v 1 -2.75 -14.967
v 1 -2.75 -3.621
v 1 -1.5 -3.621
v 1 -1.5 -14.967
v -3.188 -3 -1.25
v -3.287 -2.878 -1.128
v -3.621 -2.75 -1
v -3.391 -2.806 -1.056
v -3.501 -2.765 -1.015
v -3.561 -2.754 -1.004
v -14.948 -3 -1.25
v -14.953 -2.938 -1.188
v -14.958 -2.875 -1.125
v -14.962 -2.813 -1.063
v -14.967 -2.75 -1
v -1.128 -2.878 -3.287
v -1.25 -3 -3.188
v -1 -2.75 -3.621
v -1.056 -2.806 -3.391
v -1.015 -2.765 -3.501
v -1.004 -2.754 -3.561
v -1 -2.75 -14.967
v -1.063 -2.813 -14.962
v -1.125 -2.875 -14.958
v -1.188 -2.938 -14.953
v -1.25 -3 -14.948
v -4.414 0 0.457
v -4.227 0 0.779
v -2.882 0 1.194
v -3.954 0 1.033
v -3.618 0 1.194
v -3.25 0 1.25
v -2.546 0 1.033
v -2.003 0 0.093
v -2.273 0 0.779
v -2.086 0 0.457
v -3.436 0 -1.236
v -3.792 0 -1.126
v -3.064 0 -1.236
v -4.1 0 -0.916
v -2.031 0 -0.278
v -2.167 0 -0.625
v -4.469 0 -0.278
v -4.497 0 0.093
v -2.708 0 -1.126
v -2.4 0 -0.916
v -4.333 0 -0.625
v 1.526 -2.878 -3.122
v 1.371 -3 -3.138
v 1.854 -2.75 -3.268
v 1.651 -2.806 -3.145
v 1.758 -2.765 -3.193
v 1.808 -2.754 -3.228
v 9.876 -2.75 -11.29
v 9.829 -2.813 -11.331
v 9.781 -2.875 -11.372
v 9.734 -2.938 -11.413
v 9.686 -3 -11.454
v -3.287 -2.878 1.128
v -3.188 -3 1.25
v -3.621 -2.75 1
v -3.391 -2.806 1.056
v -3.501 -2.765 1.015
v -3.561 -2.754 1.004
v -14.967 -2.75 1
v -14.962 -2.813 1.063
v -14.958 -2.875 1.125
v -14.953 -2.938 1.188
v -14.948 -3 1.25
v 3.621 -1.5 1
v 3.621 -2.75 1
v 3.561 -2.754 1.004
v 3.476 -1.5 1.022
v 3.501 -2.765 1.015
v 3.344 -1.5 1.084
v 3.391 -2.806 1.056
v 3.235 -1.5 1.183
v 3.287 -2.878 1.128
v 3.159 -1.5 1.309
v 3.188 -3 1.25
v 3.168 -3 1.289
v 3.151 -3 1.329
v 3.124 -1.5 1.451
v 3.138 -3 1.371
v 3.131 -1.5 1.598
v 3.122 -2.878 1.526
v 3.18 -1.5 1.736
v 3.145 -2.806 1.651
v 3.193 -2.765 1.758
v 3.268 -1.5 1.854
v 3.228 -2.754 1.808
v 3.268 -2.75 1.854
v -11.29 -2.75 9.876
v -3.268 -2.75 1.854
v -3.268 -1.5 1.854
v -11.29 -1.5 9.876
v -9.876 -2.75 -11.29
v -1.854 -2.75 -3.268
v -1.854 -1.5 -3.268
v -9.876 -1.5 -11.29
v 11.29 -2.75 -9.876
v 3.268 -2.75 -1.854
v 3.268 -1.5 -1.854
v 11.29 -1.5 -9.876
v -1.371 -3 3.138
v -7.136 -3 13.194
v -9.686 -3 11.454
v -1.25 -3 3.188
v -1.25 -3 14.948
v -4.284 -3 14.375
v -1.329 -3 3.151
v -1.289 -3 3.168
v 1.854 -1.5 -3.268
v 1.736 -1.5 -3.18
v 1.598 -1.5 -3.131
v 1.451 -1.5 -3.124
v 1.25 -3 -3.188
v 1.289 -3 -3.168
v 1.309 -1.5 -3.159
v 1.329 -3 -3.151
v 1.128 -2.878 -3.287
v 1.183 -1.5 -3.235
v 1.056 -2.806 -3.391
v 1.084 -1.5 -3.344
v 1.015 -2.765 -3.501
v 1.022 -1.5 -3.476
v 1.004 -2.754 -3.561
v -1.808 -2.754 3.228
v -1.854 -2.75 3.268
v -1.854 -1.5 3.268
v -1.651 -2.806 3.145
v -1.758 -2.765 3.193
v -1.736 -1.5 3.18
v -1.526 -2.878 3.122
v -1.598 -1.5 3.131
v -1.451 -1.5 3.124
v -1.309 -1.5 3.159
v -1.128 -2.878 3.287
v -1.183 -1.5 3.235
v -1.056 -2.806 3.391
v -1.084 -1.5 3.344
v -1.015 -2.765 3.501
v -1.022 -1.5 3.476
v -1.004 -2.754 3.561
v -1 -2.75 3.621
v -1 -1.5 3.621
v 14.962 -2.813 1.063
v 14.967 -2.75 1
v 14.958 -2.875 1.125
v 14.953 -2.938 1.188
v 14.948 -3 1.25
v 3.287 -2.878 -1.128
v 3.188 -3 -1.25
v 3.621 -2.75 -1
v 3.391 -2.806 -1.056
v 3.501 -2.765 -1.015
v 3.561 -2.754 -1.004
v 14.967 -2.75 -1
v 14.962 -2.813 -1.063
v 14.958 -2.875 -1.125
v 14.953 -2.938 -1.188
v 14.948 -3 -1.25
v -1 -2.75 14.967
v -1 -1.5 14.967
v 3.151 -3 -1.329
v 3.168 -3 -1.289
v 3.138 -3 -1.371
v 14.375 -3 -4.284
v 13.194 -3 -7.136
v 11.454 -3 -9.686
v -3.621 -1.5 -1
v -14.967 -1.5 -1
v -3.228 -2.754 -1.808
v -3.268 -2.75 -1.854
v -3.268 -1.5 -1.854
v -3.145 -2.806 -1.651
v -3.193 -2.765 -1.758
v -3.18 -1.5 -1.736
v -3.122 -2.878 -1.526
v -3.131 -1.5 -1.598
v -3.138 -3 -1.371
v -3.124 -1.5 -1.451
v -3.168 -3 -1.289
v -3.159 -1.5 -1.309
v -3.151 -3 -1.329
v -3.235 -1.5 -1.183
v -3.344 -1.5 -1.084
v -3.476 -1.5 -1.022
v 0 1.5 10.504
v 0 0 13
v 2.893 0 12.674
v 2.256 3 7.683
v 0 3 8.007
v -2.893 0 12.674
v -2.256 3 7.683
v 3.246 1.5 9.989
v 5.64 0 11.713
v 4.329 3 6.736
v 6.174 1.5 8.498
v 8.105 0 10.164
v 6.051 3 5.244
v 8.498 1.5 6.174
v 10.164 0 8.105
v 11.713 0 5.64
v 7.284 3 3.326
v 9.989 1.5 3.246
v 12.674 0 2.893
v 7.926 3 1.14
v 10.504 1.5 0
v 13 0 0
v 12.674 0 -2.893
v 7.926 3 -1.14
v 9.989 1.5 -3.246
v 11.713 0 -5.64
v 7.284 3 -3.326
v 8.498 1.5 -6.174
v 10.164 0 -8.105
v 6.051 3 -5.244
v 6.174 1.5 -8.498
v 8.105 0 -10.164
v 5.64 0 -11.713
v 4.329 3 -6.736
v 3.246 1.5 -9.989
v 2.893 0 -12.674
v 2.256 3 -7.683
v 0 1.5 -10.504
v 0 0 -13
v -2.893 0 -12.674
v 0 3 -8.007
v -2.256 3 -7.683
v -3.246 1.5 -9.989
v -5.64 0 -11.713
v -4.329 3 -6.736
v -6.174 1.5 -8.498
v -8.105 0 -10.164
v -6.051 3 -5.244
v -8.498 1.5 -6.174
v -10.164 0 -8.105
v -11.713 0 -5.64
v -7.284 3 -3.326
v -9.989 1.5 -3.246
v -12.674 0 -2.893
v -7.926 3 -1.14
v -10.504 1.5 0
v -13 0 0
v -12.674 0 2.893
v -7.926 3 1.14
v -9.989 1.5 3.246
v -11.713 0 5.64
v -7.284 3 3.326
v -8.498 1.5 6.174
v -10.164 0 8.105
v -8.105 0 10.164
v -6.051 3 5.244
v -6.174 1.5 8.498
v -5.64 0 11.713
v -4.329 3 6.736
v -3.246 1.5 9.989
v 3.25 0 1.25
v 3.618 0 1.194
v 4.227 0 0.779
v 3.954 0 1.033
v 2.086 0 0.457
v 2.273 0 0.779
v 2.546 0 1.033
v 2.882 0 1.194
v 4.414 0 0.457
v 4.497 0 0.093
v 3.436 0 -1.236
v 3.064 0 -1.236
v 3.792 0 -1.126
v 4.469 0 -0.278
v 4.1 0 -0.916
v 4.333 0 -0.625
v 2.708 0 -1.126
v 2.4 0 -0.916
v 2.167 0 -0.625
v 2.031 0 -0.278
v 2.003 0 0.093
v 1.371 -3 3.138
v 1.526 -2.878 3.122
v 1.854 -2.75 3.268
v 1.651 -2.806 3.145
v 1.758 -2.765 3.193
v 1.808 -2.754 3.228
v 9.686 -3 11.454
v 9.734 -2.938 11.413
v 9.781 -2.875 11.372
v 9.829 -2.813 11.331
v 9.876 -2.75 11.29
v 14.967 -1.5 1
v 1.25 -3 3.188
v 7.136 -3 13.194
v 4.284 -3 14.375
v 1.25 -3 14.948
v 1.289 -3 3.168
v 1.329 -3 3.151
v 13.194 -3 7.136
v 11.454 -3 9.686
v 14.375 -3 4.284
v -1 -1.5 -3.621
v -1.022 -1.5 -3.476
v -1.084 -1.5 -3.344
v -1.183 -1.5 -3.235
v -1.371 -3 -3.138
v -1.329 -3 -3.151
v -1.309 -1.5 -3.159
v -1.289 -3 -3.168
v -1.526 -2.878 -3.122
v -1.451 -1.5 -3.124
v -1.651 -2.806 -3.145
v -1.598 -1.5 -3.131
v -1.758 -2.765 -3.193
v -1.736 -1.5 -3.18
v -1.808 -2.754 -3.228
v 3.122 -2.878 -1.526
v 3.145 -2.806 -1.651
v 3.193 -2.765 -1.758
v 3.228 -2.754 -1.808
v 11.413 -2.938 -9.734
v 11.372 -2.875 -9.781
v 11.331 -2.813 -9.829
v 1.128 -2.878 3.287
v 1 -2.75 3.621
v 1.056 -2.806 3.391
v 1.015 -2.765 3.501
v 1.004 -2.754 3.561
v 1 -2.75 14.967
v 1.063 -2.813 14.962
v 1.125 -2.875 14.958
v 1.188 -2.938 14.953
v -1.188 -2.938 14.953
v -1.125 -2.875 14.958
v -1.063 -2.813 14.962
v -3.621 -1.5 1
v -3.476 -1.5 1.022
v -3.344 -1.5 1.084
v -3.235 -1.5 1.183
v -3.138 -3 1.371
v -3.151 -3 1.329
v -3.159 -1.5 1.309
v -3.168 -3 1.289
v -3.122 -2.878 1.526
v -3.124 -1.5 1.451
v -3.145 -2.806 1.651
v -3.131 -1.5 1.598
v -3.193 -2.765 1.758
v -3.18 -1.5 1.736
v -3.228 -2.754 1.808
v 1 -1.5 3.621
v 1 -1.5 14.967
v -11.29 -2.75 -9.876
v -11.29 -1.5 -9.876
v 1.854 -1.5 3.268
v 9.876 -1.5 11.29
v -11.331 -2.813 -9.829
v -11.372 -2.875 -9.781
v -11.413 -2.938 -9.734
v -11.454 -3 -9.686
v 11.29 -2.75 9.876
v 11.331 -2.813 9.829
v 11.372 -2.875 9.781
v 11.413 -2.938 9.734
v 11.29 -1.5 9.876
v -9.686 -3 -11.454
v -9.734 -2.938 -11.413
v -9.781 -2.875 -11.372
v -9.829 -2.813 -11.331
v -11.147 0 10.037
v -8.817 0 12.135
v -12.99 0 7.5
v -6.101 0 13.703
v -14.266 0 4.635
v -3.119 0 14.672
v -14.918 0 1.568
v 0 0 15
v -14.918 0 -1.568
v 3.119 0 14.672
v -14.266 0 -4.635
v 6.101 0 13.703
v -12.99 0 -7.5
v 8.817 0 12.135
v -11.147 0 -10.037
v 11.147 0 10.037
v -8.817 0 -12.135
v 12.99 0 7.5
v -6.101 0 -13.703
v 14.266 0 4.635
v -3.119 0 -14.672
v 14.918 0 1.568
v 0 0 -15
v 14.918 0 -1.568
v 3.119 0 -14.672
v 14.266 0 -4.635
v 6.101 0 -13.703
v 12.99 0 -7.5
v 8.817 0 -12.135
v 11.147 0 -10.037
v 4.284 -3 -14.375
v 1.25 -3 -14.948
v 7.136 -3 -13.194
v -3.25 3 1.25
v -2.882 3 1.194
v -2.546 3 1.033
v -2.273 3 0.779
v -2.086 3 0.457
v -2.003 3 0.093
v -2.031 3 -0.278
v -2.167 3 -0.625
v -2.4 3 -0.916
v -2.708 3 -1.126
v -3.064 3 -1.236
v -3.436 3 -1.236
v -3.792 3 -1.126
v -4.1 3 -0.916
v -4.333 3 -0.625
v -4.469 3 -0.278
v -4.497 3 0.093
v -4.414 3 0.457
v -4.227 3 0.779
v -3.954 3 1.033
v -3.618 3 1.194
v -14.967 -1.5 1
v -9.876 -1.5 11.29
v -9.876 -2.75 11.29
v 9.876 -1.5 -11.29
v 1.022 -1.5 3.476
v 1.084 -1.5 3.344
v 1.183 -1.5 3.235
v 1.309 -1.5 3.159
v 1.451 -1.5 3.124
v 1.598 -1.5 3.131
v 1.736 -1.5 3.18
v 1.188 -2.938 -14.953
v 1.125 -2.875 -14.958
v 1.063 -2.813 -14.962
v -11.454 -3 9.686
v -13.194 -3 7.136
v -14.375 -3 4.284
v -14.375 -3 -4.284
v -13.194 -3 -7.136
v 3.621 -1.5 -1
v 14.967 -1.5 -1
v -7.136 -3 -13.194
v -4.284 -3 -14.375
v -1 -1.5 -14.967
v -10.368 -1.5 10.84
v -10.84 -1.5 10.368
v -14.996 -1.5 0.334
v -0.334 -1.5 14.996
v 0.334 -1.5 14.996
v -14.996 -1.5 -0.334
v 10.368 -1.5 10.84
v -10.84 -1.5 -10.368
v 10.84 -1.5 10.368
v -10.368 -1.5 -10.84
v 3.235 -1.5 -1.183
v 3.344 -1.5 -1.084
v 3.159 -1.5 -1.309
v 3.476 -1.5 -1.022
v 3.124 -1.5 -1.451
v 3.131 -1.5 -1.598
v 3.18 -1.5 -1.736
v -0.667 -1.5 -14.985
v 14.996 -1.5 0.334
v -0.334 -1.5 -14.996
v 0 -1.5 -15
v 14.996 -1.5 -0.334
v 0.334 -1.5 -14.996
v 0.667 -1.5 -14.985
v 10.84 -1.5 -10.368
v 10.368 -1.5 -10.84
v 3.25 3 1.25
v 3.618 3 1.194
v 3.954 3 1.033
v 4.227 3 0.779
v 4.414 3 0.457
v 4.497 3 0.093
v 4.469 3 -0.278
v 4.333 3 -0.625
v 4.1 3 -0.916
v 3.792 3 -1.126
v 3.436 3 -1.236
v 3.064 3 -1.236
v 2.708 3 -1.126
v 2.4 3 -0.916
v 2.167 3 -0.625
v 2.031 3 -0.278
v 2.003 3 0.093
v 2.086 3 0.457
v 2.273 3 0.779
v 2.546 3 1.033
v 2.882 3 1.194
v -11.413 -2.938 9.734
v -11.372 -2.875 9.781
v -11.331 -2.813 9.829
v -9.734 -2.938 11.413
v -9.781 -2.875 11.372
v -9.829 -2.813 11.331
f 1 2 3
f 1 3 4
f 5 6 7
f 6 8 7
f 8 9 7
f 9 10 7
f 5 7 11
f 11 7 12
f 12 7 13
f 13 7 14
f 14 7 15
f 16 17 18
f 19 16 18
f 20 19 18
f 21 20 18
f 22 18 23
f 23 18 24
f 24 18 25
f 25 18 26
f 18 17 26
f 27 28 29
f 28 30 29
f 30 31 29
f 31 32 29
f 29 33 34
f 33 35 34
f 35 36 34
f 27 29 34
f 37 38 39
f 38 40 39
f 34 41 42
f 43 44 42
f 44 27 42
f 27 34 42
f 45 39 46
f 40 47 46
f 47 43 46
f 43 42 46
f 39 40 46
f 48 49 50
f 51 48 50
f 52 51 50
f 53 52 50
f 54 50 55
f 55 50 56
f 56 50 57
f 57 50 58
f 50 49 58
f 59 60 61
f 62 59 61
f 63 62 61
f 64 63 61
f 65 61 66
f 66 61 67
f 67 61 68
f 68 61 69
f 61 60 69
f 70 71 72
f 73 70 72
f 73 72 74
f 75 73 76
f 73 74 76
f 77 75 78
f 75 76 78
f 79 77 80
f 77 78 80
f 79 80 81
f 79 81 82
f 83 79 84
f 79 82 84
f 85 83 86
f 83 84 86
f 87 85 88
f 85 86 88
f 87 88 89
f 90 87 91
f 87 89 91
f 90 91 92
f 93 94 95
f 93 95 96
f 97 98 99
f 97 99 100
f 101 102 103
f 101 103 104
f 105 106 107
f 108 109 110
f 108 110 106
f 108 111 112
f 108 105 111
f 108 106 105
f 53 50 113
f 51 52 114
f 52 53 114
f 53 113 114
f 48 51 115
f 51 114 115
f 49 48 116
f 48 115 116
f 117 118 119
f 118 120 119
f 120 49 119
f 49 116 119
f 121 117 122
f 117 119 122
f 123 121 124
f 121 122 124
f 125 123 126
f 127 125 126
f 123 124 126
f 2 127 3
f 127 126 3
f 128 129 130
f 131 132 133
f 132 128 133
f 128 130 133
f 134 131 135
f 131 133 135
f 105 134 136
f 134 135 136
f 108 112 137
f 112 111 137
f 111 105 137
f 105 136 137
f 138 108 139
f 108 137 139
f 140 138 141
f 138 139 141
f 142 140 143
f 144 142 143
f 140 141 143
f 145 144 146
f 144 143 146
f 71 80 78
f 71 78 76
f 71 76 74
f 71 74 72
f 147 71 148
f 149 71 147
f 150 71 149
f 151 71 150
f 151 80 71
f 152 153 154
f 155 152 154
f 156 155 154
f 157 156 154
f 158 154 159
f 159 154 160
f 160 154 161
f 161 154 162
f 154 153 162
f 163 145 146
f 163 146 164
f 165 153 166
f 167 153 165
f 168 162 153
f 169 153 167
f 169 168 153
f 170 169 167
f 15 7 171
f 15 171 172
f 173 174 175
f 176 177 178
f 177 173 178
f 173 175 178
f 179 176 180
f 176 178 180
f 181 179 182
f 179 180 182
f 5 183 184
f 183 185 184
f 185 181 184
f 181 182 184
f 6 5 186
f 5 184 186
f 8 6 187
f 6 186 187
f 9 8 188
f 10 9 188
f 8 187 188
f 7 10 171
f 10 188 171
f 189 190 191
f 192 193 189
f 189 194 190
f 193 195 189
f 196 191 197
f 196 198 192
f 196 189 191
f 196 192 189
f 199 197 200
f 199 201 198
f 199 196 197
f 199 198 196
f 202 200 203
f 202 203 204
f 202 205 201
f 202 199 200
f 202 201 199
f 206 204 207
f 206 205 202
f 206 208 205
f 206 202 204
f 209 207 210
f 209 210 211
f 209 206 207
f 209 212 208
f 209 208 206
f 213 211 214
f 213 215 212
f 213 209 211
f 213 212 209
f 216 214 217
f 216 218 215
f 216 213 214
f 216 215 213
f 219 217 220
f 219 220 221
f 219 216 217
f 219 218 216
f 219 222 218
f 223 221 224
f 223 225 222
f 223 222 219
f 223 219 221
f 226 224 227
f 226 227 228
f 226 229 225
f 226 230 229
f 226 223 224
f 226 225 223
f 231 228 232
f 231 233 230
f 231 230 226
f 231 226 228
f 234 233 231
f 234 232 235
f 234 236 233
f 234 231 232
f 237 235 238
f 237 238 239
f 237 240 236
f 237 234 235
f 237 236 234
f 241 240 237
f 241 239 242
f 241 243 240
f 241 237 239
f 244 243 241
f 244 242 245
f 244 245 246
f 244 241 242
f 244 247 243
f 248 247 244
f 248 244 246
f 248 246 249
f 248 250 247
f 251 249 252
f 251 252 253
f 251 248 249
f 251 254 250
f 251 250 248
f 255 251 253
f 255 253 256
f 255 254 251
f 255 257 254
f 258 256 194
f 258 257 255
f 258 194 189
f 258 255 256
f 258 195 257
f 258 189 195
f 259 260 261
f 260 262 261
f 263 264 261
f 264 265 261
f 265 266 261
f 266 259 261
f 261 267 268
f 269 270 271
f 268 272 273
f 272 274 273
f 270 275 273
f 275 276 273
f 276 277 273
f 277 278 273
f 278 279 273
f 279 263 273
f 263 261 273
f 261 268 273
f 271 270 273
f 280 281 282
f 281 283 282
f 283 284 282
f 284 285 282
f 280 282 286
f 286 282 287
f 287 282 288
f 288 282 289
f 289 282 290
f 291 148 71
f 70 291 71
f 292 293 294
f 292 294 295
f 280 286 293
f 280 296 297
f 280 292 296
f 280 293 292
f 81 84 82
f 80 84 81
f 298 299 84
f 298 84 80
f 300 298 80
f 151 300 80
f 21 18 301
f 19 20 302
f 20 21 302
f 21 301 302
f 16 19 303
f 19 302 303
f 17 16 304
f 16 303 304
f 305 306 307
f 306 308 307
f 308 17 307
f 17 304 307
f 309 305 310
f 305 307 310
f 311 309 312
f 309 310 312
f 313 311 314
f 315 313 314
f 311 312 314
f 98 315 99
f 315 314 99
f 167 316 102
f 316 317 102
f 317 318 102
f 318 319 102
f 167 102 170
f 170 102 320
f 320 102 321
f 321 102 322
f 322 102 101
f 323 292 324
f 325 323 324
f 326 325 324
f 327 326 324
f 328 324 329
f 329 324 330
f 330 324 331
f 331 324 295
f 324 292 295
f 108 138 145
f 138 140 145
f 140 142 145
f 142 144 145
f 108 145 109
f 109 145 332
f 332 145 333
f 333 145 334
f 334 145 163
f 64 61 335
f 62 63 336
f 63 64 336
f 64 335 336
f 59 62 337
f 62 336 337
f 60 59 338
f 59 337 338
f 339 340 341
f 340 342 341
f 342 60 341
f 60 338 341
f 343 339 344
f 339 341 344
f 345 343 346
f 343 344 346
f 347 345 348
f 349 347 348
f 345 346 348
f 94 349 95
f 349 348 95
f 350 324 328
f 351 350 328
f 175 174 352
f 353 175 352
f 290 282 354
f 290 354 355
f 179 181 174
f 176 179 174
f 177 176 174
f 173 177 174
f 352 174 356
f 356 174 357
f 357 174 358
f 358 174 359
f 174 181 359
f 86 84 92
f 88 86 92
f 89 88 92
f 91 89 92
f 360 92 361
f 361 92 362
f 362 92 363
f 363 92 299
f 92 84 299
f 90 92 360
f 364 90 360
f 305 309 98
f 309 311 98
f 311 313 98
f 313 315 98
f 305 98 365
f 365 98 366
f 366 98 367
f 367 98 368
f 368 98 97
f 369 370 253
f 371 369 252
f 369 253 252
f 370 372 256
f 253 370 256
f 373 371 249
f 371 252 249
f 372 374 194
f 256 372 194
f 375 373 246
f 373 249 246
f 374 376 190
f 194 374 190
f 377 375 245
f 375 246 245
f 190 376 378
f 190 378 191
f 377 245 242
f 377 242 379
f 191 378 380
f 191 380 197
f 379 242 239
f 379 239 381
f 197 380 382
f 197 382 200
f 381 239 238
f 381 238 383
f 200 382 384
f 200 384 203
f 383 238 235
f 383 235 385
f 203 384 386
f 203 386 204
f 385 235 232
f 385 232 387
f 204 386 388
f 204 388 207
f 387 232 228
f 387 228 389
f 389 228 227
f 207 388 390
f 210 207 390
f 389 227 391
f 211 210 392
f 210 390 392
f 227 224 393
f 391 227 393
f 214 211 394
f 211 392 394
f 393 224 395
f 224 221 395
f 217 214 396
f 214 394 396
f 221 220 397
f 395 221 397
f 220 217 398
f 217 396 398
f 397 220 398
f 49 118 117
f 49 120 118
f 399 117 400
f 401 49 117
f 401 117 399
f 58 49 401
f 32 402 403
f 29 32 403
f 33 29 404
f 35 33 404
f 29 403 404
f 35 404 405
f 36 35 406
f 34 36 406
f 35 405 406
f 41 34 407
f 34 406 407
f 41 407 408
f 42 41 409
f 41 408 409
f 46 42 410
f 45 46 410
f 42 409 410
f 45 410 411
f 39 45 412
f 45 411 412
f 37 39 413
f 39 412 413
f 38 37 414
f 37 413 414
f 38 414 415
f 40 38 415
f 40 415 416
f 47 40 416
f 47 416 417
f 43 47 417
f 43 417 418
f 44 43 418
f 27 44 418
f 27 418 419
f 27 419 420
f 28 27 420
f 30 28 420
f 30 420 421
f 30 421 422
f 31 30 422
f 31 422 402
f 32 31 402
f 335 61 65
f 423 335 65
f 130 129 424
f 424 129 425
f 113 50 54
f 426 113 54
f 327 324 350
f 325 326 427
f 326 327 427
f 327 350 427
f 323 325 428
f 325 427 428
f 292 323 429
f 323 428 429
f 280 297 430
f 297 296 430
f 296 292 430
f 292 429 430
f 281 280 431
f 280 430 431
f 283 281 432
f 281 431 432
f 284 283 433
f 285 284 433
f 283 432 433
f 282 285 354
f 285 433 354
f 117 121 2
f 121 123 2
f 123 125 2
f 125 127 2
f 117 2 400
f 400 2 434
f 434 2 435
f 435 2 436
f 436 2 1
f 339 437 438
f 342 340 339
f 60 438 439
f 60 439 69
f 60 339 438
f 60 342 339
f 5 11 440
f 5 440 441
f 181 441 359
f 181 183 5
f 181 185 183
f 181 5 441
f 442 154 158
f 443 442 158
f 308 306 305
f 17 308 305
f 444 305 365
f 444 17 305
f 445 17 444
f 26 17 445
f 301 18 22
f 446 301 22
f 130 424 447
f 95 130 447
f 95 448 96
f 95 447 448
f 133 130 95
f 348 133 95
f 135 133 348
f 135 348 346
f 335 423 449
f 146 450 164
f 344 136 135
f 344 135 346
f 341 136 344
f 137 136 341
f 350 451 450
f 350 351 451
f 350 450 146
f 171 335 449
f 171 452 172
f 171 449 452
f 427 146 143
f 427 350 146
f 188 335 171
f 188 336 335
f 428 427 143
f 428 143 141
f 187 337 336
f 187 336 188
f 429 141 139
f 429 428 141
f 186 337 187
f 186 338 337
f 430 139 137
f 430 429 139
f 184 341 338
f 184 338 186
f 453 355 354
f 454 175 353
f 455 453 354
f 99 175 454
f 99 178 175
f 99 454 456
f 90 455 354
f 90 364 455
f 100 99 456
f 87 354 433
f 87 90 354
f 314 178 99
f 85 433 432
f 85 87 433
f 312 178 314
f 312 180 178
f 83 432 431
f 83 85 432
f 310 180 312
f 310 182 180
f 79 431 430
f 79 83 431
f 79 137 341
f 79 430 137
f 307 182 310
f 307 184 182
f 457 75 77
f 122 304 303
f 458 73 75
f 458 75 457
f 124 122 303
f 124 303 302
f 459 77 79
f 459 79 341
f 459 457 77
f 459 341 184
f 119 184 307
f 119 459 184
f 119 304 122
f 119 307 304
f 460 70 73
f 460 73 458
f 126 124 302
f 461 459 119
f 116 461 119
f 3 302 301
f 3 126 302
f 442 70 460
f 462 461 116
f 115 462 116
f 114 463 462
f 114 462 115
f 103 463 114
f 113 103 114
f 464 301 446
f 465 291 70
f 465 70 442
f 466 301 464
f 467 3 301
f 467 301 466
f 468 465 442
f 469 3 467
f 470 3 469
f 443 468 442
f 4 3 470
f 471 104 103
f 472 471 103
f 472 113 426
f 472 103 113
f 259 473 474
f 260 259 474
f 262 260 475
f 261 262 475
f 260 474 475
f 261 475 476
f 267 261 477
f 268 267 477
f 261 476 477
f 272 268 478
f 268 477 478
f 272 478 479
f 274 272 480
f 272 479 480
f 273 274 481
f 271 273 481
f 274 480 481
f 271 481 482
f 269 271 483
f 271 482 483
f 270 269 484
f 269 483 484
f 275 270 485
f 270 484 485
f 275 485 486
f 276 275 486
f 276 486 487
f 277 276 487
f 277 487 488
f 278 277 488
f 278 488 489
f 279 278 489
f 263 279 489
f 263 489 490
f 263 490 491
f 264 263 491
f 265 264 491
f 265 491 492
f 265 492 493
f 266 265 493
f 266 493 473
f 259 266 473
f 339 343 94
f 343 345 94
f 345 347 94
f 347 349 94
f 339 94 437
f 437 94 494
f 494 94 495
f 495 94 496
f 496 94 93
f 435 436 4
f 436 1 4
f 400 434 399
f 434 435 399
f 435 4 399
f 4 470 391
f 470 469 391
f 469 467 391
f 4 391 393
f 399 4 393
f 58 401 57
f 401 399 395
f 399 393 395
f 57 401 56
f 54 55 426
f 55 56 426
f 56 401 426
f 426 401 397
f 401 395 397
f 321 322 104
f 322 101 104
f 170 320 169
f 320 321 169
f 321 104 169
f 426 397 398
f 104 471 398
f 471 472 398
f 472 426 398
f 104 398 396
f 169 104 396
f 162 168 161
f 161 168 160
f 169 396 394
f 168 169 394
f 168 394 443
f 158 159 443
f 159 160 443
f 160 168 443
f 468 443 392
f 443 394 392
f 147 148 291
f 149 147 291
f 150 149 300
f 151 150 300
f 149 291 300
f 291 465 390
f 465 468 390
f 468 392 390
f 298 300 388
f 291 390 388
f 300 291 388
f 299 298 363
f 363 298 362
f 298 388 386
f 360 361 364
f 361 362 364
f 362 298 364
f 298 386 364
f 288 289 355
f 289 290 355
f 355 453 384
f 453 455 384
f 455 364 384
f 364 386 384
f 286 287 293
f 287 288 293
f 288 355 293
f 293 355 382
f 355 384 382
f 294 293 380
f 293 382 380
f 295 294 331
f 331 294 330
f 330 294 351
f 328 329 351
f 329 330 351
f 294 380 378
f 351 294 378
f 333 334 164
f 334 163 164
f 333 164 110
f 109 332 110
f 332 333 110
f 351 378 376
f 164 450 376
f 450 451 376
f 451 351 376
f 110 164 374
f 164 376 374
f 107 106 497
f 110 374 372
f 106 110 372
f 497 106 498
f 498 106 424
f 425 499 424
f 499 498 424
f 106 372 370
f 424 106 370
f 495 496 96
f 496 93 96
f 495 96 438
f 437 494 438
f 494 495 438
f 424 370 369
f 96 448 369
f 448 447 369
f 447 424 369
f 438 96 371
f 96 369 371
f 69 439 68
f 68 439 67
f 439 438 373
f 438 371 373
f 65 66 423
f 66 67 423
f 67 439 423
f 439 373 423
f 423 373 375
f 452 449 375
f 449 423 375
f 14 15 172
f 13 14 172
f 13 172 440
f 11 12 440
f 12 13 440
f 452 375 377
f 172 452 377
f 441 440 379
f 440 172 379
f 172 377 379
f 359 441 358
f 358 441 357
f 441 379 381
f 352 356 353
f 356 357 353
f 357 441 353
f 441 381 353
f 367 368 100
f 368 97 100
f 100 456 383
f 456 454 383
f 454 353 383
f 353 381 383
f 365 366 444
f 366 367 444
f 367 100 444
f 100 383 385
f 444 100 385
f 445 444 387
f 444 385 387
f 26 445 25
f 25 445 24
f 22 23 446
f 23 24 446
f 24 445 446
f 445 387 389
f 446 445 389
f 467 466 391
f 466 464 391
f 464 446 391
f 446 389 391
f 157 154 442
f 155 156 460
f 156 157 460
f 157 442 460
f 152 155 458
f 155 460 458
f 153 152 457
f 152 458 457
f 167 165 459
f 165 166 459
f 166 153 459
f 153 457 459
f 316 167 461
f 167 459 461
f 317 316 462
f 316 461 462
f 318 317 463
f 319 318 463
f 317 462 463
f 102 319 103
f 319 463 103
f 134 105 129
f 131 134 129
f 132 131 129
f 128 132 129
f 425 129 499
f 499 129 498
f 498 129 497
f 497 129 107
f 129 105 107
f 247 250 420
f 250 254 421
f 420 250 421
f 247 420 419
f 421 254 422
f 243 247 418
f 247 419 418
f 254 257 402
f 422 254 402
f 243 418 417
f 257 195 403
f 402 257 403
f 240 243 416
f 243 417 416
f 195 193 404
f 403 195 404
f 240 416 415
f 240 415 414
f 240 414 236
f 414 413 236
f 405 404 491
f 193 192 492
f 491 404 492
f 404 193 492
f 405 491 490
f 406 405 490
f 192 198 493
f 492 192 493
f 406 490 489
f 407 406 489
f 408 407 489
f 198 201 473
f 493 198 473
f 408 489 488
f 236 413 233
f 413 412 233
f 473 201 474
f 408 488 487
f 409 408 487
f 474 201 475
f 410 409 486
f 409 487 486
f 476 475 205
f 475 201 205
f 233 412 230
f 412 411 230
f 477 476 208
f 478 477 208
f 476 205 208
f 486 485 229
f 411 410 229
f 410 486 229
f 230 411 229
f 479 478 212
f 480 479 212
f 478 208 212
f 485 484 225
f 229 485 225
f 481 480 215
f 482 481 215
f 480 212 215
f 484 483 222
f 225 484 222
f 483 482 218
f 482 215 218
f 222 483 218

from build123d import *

# Parameters (mm, degrees)
SKETCH1_R                    = 8
BOSS_EXTRUDE1_DEPTH          = 3
SKETCH2_R                    = 1.25
CUT_EXTRUDE1_DEPTH           = 12.704699911
SKETCH3_R                    = 15
BOSS_EXTRUDE2_DEPTH          = 3
CHAMFER1_SIZE                = 5
CHAMFER1_SIZE_2              = 3.004303095
SKETCH4_W                    = 15
SKETCH4_H                    = 2
CUT_EXTRUDE2_DEPTH           = 1.5
CHAMFER2_SIZE                = 0.25
CIRPATTERN1_COUNT            = 8
CHAMFER2_OF_CIRPATTERN1_SIZE = 0.25
FILLET1_R                    = 0.5


with BuildPart() as part:
    # Sketch1 → Boss-Extrude1 (new body)
    with BuildSketch(Plane(origin=(0, 0, 0), x_dir=(1, 0, 0), z_dir=(0, 1, 0))):
        with Locations(Location((0, 0, 0), (0, 0, 270))):
            Circle(SKETCH1_R)
    extrude(amount=BOSS_EXTRUDE1_DEPTH)

    # Sketch2 → Cut-Extrude1 (cut, through all)
    with BuildSketch(Plane(origin=(0, 3, 0), x_dir=(1, 0, 0), z_dir=(0, 1, 0))):
        with Locations(Location((-3.25, 0, 0), (0, 0, 270))):
            Circle(SKETCH2_R)
        with Locations(Location((3.25, 0, 0), (0, 0, 270))):
            Circle(SKETCH2_R)
    extrude(amount=-CUT_EXTRUDE1_DEPTH, mode=Mode.SUBTRACT)

    # Sketch3 → Boss-Extrude2 (add)
    with BuildSketch(Plane.XZ):
        with Locations(Location((0, 0, 0), (0, 0, 270))):
            Circle(SKETCH3_R)
    extrude(amount=BOSS_EXTRUDE2_DEPTH)

    # Chamfer1
    # the kernel refuses this chamfer: 5, 3.004303095 mm, written as the material it adds along each edge
    with BuildSketch(Plane(origin=(0, 0, 0), x_dir=(0, 0, 1), z_dir=(-1, 0, 0))) as chamfer1_piece_1_section:
        Polygon((8 + CHAMFER1_SIZE, 0), (8, CHAMFER1_SIZE_2), (8, 0), align=None)
    chamfer1_piece_1 = revolve(axis=Axis((0, 0, 0), (0, 1, 0)), mode=Mode.PRIVATE)
    chamfer1_piece_1 = split(chamfer1_piece_1, bisect_by=Plane(origin=(0, 3, -10.54798904), z_dir=(0, -1, 0)), keep=Keep.TOP, mode=Mode.PRIVATE)
    add(chamfer1_piece_1)

    # Sketch4 → Cut-Extrude2 (cut)
    with BuildSketch(Plane.XZ.offset(3)):
        with Locations((7.5, 0)):
            Rectangle(SKETCH4_W, SKETCH4_H)
    cut_extrude2 = extrude(amount=-CUT_EXTRUDE2_DEPTH, mode=Mode.SUBTRACT)

    # Chamfer2
    chamfer2_edges = [part.edges().sort_by_distance(p)[0] for p in [
        (7.483314774, -3, 1),
        (7.483314774, -3, -1),
    ]]
    chamfer(chamfer2_edges, length=CHAMFER2_SIZE)

    # CirPattern1: Cut-Extrude2 ×8 about axis
    cirpattern1_axis = Axis((0, 0, 0), (0, 1, 0))
    for i in range(1, CIRPATTERN1_COUNT):
        add(cut_extrude2.rotate(cirpattern1_axis, i * 360 / CIRPATTERN1_COUNT), mode=Mode.SUBTRACT)

    # Chamfer2 of CirPattern1
    chamfer2_of_cirpattern1_edges = [part.edges().sort_by_distance(p)[0] for p in [
        (5.998609403, -3, -4.584395841),
        (4.584395841, -3, -5.998609403),
        (1, -3, -7.483314774),
        (-1, -3, -7.483314774),
        (-4.584395841, -3, -5.998609403),
        (-5.998609403, -3, -4.584395841),
        (-7.483314774, -3, -1),
        (-7.483314774, -3, 1),
        (-5.998609403, -3, 4.584395841),
        (-4.584395841, -3, 5.998609403),
        (-1, -3, 7.483314774),
        (1, -3, 7.483314774),
        (4.584395841, -3, 5.998609403),
        (5.998609403, -3, 4.584395841),
    ]]
    chamfer(chamfer2_of_cirpattern1_edges, length=CHAMFER2_OF_CIRPATTERN1_SIZE)

    # Fillet1
    # the kernel refuses this fillet: 0.5 mm, written as the material it takes off along each edge
    with BuildSketch(Plane(origin=(1, -1.5, -2.414213562), x_dir=(0, 0, -1), z_dir=(0, -1, 0)), Plane(origin=(-1, -1.5, 2.414213562), x_dir=(0, 0, 1), z_dir=(0, -1, 0)), Plane(origin=(1, -1.5, 2.414213562), x_dir=(0.7071067811865474, 0, 0.7071067811865477), z_dir=(0, -1, 0)), Plane(origin=(2.414213562, -1.5, -1), x_dir=(0.7071067811865472, 0, -0.7071067811865478), z_dir=(0, -1, 0))) as fillet1_piece_1:
        with BuildLine():
            CenterArc((FILLET1_R * 2.41421356237, FILLET1_R), FILLET1_R, 135, 135)
            Line((FILLET1_R * 1.70710678119, FILLET1_R * 1.70710678119), (0, 0))
            Line((0, 0), (FILLET1_R * 2.41421356237, 0))
        make_face()
    extrude(amount=4.267766953, mode=Mode.SUBTRACT)
    with BuildSketch(Plane(origin=(-1, -1.5, -2.414213562), x_dir=(0, 0, -1), z_dir=(0, -1, 0)), Plane(origin=(-2.414213562, -1.5, -1), x_dir=(-0.7071067811865478, 0, -0.7071067811865474), z_dir=(0, -1, 0)), Plane(origin=(-2.414213562, -1.5, 1), x_dir=(-1, 0, 0), z_dir=(0, -1, 0)), Plane(origin=(2.414213562, -5.767766953, 1), x_dir=(1, 0, 0), z_dir=(0, 1, 0))) as fillet1_piece_2:
        with BuildLine():
            CenterArc((FILLET1_R * 2.41421356237, -FILLET1_R), FILLET1_R, 90, 135)
            Line((FILLET1_R * 1.70710678119, -FILLET1_R * 1.70710678119), (0, 0))
            Line((0, 0), (FILLET1_R * 2.41421356237, 0))
        make_face()
    extrude(amount=4.267766953, mode=Mode.SUBTRACT)


solid = part.part
